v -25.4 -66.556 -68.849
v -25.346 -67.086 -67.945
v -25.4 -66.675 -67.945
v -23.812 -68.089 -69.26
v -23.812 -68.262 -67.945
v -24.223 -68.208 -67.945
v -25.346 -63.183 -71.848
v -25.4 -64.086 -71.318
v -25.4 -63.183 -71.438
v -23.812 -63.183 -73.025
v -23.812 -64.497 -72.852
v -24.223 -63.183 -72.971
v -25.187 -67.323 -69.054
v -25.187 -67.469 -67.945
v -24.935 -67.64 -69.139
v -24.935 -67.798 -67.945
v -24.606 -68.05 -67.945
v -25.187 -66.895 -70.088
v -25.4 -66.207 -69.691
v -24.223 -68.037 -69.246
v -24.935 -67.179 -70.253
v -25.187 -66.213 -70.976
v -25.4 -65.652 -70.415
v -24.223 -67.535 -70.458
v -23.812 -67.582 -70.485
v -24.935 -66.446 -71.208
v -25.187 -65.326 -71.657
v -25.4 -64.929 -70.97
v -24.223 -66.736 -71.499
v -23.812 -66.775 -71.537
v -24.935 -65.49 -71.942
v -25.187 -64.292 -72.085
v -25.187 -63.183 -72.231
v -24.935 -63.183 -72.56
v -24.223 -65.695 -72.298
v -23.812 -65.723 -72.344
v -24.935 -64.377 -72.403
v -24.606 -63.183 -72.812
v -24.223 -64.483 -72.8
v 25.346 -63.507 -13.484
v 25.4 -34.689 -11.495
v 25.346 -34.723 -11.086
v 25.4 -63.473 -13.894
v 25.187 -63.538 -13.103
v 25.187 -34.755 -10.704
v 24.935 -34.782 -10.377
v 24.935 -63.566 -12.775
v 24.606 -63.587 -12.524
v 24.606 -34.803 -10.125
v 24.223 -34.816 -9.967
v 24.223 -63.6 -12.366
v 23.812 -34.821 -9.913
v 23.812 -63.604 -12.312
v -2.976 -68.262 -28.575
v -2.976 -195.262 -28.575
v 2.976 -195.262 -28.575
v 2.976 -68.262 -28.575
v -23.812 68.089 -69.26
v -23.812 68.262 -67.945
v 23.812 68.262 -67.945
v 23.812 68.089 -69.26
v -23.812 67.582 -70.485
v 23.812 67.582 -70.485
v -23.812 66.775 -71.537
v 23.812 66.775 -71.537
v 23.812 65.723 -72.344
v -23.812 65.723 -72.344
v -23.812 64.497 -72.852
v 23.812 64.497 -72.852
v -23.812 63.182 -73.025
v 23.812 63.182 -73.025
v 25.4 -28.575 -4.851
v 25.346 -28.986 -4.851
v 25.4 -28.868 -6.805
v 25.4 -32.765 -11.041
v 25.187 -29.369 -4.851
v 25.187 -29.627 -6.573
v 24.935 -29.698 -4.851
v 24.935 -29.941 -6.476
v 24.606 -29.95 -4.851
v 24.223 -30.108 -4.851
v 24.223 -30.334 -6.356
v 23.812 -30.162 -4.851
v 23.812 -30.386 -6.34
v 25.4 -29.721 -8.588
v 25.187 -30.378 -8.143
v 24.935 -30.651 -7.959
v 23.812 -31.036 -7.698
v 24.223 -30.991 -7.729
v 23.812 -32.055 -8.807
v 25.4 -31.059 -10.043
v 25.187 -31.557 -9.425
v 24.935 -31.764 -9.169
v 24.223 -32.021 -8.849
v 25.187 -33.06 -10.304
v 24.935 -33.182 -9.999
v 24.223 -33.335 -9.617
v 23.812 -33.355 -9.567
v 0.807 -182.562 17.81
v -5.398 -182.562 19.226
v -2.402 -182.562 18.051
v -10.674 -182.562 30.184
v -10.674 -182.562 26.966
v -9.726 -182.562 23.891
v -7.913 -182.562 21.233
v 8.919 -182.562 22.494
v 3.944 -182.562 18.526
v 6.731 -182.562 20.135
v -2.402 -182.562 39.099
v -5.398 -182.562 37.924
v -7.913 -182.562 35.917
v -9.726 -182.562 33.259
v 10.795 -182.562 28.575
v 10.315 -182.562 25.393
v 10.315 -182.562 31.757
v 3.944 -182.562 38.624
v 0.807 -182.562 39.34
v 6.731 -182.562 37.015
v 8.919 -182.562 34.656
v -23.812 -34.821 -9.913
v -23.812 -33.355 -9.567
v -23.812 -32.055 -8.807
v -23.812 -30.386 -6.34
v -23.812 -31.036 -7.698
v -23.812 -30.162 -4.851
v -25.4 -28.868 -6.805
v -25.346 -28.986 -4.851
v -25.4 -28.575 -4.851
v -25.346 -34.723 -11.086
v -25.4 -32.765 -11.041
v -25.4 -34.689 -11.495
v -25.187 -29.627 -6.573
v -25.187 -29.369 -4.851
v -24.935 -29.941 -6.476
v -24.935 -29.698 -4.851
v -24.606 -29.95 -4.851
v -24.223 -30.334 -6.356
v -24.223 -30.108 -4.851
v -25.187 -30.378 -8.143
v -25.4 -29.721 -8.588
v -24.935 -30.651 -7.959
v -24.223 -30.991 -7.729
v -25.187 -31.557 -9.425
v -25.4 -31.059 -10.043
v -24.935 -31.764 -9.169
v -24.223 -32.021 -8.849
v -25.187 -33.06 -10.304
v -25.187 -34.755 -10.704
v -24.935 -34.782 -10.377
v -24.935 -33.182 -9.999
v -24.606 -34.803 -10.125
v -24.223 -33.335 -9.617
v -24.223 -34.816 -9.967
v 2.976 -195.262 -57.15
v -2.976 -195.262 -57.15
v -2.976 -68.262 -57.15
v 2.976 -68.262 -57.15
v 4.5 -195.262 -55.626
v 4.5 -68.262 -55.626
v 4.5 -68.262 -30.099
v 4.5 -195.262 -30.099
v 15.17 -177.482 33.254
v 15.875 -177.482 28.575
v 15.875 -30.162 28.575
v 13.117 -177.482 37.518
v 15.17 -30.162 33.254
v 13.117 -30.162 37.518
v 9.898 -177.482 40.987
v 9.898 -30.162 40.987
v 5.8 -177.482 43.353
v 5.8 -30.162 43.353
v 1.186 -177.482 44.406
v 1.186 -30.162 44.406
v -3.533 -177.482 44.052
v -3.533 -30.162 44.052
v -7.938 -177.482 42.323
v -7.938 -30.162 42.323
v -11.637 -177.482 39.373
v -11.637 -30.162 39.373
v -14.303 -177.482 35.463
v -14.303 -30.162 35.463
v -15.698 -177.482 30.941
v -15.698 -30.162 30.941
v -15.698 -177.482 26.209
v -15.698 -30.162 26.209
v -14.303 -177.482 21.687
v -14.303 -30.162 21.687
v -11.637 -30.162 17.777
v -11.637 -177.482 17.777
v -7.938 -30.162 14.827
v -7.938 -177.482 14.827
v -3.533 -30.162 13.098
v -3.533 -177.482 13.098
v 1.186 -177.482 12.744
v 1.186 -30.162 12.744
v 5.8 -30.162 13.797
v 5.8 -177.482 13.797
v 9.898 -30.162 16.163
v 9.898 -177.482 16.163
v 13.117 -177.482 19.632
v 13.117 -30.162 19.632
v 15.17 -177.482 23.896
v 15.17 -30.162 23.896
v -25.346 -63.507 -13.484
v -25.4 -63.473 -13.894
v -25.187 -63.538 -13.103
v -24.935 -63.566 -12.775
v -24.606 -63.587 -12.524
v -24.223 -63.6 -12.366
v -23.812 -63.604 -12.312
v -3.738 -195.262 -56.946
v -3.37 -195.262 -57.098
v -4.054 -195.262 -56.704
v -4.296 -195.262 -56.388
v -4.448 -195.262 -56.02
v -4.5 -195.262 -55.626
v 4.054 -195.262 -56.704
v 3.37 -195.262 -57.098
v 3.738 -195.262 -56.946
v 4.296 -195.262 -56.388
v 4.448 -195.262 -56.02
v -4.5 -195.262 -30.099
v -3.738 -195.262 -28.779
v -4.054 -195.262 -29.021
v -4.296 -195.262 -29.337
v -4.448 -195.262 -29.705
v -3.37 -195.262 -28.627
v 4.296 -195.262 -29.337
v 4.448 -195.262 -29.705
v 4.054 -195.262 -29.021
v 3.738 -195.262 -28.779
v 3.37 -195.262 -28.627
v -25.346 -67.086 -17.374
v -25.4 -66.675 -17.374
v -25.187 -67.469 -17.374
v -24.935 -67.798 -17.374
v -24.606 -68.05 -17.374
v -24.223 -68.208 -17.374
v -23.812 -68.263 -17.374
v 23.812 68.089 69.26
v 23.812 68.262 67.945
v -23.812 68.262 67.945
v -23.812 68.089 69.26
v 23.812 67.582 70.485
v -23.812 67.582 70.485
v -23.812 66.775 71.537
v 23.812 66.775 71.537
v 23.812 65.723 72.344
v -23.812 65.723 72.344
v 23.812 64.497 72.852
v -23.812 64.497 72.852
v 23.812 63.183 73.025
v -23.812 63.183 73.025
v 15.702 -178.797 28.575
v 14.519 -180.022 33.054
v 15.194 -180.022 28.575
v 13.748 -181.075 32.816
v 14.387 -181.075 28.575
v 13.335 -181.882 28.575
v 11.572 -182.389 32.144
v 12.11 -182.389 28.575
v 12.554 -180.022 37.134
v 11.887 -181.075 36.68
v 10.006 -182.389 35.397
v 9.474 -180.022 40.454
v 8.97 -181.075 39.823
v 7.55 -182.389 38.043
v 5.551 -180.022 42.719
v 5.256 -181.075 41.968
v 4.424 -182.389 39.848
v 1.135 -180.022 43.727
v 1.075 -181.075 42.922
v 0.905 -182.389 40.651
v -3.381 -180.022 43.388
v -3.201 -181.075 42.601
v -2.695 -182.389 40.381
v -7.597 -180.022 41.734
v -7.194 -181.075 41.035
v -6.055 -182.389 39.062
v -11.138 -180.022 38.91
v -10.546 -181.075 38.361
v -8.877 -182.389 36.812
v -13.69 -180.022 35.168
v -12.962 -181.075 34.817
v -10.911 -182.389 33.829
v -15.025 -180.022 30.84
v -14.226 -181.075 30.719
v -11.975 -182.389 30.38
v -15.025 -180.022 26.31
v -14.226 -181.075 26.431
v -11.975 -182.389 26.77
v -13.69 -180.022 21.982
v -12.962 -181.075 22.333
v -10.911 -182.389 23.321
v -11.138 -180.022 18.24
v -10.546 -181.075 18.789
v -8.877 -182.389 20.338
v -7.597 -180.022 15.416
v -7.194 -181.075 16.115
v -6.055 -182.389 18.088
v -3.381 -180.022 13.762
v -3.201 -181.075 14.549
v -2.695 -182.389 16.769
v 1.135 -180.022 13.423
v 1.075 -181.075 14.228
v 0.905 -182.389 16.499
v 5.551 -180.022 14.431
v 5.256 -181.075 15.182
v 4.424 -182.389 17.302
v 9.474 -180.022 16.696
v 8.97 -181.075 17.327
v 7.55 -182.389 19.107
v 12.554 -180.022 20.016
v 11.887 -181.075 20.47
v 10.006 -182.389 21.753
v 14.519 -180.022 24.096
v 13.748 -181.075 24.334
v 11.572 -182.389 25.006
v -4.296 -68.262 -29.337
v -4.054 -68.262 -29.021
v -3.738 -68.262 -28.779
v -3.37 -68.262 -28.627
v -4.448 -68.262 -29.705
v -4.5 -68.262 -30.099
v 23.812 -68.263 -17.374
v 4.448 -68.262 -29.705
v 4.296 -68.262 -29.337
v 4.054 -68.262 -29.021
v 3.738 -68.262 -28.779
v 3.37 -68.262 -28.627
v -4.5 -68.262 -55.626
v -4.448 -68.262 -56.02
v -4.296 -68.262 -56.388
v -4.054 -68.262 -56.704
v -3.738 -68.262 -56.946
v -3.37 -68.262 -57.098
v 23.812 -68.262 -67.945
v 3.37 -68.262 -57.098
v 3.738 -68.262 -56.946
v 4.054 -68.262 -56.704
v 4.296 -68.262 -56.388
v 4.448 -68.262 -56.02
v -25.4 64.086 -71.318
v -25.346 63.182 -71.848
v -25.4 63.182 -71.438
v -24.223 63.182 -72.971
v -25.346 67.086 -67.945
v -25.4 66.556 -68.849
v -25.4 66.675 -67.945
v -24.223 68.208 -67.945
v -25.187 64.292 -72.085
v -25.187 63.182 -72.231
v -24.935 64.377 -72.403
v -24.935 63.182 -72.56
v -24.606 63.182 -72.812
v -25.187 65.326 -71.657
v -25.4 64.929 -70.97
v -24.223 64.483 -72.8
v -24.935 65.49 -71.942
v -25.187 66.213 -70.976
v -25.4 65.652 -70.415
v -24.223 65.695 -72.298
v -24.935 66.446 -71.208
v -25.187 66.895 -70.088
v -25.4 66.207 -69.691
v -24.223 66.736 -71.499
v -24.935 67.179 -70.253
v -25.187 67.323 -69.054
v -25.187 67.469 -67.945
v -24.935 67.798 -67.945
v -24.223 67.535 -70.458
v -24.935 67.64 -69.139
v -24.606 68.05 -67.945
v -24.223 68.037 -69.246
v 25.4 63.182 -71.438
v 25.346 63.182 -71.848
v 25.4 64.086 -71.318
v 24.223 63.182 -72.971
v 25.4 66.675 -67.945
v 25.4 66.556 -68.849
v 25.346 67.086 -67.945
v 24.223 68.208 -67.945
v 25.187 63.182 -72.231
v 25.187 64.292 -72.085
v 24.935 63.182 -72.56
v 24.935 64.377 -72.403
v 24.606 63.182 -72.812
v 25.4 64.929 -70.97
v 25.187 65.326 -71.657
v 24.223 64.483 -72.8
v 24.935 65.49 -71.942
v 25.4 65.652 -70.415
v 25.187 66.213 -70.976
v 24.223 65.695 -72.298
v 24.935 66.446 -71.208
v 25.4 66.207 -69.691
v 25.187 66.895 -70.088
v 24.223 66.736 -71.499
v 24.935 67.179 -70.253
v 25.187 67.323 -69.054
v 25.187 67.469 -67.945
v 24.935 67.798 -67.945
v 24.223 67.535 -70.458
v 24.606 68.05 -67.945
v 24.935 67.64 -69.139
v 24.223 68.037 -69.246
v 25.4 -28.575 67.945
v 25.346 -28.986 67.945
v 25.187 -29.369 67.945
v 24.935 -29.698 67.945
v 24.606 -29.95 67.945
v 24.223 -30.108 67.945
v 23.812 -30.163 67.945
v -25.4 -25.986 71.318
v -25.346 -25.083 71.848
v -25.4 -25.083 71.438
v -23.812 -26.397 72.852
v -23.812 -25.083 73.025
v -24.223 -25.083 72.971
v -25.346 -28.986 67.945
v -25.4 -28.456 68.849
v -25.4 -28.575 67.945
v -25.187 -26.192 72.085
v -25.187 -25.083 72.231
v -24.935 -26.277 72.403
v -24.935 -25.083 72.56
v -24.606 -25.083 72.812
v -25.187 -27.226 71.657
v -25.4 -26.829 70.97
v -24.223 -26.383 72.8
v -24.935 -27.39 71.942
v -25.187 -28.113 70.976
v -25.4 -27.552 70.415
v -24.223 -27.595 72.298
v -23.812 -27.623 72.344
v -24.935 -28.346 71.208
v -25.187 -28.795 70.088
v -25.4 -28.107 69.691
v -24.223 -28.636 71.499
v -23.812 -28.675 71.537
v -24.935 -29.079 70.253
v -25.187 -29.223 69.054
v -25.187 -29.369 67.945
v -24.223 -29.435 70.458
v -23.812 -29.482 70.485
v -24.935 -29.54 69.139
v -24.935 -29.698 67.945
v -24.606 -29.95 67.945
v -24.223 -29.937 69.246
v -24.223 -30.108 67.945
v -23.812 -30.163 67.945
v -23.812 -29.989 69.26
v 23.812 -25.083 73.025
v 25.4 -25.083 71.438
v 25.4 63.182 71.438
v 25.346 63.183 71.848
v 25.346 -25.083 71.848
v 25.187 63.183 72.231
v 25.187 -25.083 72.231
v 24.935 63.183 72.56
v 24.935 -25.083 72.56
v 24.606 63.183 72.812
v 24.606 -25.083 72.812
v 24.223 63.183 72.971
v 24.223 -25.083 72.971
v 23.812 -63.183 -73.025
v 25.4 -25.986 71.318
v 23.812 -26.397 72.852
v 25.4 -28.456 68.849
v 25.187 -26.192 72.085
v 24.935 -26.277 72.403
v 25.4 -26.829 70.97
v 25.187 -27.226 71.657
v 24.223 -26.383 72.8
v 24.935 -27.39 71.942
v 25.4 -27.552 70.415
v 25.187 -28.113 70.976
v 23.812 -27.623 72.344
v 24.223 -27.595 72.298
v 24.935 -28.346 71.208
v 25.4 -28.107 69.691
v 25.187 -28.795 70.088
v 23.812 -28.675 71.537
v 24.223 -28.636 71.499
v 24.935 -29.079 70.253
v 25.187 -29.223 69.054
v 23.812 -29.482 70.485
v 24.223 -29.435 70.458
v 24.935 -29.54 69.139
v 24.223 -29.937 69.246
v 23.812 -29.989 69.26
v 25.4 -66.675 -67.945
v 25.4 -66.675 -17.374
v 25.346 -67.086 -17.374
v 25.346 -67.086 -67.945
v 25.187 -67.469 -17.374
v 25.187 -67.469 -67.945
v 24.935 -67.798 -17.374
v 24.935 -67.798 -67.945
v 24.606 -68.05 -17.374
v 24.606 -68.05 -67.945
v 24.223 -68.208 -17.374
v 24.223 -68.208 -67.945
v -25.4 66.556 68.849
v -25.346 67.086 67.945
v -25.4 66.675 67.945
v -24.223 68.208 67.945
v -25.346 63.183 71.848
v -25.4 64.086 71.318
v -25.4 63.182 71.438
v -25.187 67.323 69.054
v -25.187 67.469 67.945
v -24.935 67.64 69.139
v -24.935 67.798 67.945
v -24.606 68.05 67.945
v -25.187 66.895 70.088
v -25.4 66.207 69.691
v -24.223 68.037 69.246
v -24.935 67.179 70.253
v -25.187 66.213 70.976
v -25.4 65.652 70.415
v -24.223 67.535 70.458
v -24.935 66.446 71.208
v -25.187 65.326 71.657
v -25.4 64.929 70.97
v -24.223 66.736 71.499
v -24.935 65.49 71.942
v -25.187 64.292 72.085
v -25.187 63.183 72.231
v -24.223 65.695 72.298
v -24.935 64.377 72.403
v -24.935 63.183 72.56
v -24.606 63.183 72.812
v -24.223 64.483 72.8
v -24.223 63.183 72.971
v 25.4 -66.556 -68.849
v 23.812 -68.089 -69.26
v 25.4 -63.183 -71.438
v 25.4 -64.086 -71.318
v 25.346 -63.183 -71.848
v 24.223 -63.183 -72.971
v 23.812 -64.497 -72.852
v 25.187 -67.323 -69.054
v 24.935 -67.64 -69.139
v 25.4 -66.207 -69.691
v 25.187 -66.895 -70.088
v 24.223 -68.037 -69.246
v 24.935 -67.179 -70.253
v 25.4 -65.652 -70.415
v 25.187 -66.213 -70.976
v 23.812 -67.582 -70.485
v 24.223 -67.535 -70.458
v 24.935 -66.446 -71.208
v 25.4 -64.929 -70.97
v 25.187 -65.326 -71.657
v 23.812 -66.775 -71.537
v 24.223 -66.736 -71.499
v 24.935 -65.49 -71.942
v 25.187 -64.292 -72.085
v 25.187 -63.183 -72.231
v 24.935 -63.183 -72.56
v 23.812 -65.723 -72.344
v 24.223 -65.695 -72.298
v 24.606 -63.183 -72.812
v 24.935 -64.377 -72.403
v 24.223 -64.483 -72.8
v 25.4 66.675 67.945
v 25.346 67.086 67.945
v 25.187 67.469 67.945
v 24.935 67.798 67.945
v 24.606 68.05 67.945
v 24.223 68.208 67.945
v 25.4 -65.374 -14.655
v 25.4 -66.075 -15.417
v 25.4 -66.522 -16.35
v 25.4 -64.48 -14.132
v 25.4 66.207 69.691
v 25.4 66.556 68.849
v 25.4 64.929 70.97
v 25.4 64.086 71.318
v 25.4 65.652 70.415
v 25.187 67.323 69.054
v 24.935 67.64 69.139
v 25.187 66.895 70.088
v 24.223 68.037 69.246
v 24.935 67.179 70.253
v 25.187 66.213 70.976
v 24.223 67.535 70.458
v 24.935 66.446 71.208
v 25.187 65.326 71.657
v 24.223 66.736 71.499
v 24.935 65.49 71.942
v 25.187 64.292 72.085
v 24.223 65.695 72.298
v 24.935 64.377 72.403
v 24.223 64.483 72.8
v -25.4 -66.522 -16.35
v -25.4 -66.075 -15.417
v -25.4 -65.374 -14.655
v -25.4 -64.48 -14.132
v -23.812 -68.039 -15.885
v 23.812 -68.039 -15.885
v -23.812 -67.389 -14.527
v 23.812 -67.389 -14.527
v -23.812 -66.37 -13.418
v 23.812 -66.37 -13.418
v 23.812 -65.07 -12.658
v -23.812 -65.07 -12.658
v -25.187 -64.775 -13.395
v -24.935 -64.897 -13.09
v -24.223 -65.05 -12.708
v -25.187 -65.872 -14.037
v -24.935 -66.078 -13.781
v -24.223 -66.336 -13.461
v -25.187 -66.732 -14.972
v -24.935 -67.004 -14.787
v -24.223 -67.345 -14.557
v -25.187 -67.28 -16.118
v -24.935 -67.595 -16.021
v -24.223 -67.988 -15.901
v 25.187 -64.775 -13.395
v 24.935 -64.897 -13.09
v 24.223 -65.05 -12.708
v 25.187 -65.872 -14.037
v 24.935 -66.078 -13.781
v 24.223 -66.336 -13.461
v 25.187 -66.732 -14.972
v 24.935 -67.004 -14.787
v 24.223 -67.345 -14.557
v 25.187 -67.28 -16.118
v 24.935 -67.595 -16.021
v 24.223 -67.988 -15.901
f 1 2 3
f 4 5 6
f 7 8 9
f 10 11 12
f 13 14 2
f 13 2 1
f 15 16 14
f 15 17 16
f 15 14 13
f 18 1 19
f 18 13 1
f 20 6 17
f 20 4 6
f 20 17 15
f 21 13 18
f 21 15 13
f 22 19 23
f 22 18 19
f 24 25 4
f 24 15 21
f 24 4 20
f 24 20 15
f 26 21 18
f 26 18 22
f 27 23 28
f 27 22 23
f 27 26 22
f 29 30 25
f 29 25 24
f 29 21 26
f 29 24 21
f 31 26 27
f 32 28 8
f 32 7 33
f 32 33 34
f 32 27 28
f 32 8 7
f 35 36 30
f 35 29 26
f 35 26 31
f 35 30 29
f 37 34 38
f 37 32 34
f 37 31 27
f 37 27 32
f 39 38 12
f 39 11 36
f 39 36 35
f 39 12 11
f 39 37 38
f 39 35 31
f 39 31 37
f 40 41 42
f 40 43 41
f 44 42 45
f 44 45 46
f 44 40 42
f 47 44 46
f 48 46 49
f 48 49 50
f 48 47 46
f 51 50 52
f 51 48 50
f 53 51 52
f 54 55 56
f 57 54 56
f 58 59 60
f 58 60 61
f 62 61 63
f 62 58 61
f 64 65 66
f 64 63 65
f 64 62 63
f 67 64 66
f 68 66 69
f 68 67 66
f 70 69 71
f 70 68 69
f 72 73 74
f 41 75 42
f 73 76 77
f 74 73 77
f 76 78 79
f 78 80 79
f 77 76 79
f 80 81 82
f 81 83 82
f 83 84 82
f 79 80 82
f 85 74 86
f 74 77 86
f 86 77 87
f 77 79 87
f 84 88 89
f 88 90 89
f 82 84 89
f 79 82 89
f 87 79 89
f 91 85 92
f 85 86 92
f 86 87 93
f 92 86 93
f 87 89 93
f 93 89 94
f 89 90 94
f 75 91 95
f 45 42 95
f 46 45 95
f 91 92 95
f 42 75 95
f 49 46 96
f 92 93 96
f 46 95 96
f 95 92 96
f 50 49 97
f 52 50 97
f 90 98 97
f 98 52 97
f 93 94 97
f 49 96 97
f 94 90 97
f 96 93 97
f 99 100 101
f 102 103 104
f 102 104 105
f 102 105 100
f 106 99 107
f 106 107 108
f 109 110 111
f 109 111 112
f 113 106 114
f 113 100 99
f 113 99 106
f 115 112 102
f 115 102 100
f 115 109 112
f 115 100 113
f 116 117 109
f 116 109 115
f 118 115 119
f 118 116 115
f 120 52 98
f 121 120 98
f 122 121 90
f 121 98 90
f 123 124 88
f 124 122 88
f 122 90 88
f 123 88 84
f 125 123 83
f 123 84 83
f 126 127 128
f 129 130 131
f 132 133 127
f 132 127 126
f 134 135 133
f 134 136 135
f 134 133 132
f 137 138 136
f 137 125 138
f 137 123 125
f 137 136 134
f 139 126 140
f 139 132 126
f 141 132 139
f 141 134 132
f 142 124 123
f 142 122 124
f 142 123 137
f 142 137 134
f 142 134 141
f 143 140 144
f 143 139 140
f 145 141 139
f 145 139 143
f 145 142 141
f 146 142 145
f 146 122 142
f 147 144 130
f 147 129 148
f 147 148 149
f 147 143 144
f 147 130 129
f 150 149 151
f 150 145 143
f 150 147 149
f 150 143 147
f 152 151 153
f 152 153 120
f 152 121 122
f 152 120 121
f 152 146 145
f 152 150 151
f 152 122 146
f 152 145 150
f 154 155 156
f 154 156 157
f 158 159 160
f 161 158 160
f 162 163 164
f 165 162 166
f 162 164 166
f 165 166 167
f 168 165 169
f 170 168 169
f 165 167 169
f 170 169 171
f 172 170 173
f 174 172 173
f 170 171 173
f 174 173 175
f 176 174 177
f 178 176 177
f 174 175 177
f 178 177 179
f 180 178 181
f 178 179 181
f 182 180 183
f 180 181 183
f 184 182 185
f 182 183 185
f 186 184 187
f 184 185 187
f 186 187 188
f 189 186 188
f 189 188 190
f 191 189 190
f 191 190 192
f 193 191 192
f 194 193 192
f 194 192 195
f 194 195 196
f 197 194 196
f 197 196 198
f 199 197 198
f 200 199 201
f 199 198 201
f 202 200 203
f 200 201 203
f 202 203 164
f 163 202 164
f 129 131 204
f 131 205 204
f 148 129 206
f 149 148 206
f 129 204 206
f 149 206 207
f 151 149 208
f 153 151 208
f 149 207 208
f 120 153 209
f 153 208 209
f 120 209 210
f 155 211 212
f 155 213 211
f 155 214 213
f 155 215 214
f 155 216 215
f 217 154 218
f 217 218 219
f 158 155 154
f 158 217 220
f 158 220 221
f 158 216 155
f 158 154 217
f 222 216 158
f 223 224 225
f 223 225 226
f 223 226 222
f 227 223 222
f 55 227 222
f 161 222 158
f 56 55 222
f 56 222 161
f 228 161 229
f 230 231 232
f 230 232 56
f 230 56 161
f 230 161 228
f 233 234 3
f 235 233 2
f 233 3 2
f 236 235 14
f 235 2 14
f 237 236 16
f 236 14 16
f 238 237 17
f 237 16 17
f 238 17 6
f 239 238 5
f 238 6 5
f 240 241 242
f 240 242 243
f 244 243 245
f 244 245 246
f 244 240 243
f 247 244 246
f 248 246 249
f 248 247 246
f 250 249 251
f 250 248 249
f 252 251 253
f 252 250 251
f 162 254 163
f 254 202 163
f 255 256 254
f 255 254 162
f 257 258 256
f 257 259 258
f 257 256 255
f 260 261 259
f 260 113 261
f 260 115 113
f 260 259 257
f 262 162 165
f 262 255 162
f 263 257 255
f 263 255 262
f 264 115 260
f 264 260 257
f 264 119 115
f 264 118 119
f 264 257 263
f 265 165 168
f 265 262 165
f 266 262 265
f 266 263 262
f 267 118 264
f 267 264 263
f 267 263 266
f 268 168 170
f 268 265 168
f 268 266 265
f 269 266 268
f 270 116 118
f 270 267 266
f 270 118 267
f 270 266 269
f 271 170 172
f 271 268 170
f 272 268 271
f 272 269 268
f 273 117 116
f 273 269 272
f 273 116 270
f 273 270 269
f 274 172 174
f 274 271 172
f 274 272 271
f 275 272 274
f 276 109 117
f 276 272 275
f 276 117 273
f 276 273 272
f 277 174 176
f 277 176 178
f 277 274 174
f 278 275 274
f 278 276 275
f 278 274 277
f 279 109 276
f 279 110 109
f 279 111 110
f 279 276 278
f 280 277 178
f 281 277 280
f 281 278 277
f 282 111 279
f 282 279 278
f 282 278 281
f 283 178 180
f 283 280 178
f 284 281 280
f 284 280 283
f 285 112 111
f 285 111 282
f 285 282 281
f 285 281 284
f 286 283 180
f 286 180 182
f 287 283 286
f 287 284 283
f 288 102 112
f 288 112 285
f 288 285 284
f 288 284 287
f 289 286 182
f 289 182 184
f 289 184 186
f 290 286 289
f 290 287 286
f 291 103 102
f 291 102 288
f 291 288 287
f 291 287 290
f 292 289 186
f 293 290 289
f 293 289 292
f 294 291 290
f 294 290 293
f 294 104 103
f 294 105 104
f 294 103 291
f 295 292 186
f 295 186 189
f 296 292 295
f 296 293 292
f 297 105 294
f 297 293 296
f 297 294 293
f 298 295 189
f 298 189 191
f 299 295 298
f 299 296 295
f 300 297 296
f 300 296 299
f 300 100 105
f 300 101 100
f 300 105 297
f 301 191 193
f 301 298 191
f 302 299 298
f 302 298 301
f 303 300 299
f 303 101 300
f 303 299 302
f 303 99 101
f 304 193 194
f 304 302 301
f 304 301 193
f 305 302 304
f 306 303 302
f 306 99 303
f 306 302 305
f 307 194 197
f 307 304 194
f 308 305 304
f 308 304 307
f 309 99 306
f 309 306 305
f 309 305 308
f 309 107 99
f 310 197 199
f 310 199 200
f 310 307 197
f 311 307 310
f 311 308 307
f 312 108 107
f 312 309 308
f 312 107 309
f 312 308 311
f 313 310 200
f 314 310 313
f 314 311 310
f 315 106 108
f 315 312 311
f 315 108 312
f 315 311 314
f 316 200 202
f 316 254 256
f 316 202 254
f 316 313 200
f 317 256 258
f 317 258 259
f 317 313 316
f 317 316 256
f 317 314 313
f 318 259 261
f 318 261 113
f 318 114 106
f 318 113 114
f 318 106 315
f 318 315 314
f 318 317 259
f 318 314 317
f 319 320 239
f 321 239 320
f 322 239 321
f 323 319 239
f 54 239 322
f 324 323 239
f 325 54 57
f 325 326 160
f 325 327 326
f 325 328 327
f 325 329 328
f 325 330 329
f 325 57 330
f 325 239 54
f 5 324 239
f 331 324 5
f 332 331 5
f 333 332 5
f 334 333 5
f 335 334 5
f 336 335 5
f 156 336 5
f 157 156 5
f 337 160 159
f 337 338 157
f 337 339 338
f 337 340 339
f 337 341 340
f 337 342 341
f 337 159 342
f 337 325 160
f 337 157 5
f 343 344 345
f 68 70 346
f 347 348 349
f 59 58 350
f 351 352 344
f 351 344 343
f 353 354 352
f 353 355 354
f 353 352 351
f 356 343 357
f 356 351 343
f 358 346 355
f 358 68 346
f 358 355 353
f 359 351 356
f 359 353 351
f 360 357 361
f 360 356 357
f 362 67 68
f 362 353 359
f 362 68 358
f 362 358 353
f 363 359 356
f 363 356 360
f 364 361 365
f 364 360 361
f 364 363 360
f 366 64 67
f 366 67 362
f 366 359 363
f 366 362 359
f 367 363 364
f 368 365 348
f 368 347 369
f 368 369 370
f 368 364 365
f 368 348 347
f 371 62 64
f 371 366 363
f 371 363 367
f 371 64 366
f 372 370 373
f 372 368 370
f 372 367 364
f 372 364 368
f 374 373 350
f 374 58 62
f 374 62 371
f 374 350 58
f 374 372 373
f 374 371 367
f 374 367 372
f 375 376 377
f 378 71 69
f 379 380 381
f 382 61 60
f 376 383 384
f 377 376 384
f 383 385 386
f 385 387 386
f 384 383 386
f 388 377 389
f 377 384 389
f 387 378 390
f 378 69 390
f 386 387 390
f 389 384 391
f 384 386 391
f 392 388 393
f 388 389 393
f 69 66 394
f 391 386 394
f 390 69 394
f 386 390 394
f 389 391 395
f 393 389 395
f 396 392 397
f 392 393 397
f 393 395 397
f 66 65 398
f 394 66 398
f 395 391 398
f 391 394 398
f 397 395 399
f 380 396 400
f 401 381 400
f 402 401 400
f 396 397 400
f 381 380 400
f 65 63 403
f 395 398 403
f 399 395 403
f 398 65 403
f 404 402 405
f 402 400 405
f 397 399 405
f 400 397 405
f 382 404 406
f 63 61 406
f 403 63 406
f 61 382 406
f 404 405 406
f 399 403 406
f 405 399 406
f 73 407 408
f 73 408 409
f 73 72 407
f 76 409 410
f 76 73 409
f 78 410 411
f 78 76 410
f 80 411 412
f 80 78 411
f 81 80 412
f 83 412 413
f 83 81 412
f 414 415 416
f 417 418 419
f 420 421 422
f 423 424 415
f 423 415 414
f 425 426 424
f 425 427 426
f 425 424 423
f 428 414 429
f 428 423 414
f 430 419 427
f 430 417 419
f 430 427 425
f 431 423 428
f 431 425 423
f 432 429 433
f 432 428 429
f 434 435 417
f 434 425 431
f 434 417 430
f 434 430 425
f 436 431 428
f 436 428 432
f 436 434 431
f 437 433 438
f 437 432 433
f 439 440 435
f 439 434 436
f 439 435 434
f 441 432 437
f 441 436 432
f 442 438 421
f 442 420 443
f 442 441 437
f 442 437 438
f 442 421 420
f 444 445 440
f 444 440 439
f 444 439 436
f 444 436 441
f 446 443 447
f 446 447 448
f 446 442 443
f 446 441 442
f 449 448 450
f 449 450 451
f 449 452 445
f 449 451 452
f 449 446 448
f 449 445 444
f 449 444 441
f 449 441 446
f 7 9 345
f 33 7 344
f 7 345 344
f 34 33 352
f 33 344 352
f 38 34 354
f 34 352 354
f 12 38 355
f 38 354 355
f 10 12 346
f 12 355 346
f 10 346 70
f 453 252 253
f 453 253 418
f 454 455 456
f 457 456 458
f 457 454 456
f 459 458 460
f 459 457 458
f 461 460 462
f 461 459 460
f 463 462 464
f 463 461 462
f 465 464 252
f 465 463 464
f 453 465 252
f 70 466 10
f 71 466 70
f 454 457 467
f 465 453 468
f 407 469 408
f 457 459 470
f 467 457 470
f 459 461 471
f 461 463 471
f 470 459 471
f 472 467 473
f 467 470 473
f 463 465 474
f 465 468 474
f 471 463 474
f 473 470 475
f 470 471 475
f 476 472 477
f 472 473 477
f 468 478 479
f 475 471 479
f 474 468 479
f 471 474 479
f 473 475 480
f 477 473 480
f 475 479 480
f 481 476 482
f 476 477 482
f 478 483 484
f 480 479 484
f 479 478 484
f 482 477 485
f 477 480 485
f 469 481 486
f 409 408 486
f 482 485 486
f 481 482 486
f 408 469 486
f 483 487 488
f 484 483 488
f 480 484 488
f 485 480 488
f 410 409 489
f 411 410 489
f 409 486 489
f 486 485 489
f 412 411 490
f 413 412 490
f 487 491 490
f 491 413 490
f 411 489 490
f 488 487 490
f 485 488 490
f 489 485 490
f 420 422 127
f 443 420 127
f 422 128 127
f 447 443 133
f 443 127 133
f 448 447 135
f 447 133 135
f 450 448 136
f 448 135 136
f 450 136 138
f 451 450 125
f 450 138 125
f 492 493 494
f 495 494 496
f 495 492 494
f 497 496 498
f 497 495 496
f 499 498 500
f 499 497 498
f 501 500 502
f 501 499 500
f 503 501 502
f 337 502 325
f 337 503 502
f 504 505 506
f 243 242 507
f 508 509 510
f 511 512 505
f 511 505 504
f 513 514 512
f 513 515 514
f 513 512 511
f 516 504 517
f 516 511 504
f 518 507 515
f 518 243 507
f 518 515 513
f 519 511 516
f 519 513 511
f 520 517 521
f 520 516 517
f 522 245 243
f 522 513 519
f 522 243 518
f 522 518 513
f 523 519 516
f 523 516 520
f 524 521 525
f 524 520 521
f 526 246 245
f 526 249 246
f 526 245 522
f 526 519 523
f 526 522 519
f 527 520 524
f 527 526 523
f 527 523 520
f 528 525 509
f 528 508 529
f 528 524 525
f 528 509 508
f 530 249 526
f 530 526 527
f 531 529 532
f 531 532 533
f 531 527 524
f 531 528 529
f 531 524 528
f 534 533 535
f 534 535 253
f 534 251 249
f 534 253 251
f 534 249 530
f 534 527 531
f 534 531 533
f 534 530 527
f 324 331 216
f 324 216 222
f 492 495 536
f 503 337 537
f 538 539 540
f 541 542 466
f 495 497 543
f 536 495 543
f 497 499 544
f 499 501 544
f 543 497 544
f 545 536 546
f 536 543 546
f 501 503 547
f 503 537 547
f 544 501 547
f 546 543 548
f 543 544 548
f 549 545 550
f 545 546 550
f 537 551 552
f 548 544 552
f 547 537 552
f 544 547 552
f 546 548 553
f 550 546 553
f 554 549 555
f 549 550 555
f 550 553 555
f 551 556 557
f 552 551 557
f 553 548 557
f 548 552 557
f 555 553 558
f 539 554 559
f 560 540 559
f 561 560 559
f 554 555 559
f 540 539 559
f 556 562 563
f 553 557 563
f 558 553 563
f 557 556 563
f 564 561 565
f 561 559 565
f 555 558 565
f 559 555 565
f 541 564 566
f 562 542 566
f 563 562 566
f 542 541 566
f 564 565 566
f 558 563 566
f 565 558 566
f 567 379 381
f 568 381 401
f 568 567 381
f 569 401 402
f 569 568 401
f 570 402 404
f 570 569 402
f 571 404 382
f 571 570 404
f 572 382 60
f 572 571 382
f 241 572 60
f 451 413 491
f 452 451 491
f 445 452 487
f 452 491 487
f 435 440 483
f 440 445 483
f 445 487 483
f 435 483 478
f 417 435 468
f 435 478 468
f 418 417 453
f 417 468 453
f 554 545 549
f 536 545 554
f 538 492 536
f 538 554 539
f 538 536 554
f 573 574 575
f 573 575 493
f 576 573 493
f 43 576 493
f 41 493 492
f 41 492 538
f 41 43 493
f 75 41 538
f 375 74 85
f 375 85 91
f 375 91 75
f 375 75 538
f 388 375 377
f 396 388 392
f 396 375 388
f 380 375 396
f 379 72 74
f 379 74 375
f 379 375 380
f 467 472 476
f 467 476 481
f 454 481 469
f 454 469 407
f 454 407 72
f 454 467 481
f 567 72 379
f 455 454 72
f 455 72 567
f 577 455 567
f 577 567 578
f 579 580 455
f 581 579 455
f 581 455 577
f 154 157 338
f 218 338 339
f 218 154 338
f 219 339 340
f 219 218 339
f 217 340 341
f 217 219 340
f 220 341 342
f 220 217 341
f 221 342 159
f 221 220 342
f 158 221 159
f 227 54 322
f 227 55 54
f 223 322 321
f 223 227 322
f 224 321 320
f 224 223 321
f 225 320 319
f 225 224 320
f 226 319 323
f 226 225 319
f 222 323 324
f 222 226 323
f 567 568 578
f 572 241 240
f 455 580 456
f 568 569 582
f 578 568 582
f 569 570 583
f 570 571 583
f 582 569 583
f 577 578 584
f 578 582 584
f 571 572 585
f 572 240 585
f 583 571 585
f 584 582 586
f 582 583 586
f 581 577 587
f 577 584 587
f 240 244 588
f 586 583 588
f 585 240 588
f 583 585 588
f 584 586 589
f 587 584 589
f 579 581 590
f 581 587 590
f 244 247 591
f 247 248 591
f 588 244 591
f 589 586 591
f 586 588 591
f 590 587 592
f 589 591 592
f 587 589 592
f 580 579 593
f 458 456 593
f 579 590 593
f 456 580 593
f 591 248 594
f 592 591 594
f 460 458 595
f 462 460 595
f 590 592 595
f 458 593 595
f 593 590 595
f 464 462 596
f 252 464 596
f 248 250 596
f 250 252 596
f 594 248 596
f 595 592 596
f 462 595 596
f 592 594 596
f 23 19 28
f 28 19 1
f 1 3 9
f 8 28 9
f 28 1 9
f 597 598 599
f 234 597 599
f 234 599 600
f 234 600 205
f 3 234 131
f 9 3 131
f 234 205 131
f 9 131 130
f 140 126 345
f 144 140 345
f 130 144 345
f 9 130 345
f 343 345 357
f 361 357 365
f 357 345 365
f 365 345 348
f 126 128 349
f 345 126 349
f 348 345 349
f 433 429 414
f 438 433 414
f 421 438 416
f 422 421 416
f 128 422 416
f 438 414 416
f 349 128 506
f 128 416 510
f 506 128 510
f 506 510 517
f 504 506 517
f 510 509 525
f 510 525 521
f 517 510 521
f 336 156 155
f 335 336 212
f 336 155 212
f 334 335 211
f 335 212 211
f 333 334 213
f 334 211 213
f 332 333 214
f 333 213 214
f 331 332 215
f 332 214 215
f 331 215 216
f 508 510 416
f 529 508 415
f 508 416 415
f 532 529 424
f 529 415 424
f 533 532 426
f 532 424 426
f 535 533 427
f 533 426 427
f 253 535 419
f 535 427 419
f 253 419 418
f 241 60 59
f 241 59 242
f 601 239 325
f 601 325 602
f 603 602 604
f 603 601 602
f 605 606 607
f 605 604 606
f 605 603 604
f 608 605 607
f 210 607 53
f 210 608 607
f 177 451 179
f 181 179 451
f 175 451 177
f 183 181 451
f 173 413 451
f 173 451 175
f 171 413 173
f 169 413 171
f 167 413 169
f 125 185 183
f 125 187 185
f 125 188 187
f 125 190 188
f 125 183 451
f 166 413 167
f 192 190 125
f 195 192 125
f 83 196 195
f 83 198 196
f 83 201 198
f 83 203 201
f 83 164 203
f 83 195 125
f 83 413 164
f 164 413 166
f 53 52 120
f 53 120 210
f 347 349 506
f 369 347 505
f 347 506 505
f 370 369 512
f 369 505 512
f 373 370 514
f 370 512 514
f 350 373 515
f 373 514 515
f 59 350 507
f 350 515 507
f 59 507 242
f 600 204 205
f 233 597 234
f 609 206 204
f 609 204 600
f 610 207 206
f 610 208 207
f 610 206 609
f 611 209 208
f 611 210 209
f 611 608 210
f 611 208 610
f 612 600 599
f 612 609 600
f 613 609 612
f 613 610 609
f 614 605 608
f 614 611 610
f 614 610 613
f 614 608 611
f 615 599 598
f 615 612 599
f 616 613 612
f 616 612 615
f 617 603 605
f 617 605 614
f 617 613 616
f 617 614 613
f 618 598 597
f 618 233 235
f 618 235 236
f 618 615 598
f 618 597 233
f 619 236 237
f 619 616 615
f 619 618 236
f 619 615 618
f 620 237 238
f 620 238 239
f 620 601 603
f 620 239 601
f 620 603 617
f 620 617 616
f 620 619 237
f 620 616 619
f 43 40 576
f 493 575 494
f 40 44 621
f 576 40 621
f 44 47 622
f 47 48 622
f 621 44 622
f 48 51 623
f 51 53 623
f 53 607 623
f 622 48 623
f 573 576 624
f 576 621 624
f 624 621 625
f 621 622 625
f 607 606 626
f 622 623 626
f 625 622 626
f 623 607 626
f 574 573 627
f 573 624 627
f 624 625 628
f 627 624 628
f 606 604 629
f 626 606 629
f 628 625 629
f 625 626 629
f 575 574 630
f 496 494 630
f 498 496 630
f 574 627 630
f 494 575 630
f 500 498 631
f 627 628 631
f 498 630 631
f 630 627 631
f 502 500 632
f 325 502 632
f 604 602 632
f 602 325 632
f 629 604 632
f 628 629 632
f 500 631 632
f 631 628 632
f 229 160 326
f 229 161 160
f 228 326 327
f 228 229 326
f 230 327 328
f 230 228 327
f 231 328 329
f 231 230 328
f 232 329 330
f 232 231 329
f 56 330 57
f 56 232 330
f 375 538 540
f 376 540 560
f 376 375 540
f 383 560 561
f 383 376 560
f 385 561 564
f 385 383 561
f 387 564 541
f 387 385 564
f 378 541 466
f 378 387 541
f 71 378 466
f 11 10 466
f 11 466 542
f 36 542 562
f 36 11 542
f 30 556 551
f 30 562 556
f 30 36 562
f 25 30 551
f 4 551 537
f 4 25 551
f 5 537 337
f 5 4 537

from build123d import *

# Parameters (mm, degrees)
F1_DEPTH = 25.4
F2_R     = 5.08
F3_R     = 1.5875
F4_W     = 9
F4_H     = 28.575
F5_DEPTH = 127
F6_R     = 1.524
F7_R     = 15.875
F8_DEPTH = 152.4
F9_R     = 5.08


with BuildPart() as f1:
    # F0 (on Right) → F1 (new body, symmetric)
    with BuildSketch(Plane.YZ):
        Polygon((68.2625, -73.025), (68.2625, 73.025), (-30.1625, 73.025), (-30.1625, -9.525), (-68.2625, -12.7), (-68.2625, -73.025), align=None)
    extrude(amount=F1_DEPTH, both=True)

    # F2
    f2_edges = [f1.edges().sort_by_distance(p)[0] for p in [
        (0, -68.2625, -12.7),
        (0, -30.1625, -9.525),
        (0, -30.1625, 73.025),
        (0, 68.2625, 73.025),
        (0, 68.2625, -73.025),
        (0, -68.2625, -73.025),
    ]]
    fillet(f2_edges, radius=F2_R)

    # F3
    f3_edges = [f1.edges().sort_by_distance(p)[0] for p in [
        (25.4, -49.2125, -11.1125),
        (-25.4, -49.2125, -11.1125),
    ]]
    fillet(f3_edges, radius=F3_R)

    # F4 (on face) → F5 (join)
    with BuildSketch(Plane.XZ.offset(68.2625)):
        with Locations((0, -42.8625)):
            Rectangle(F4_W, F4_H)
    extrude(amount=F5_DEPTH)

    # F6
    f6_edges = [f1.edges().sort_by_distance(p)[0] for p in [
        (4.5, -131.7625, -28.575),
        (-4.5, -131.7625, -28.575),
        (4.5, -131.7625, -57.15),
        (-4.5, -131.7625, -57.15),
    ]]
    fillet(f6_edges, radius=F6_R)

    # F7 (on face) → F8 (join)
    with BuildSketch(Plane.XZ.offset(30.1625)):
        with Locations((0, 28.575)):
            Circle(F7_R)
    extrude(amount=F8_DEPTH)

    # F9
    f9_edges = [f1.edges().sort_by_distance(p)[0] for p in [
        (-15.875, -182.5625, 28.575),
    ]]
    fillet(f9_edges, radius=F9_R)


solid = f1.part
